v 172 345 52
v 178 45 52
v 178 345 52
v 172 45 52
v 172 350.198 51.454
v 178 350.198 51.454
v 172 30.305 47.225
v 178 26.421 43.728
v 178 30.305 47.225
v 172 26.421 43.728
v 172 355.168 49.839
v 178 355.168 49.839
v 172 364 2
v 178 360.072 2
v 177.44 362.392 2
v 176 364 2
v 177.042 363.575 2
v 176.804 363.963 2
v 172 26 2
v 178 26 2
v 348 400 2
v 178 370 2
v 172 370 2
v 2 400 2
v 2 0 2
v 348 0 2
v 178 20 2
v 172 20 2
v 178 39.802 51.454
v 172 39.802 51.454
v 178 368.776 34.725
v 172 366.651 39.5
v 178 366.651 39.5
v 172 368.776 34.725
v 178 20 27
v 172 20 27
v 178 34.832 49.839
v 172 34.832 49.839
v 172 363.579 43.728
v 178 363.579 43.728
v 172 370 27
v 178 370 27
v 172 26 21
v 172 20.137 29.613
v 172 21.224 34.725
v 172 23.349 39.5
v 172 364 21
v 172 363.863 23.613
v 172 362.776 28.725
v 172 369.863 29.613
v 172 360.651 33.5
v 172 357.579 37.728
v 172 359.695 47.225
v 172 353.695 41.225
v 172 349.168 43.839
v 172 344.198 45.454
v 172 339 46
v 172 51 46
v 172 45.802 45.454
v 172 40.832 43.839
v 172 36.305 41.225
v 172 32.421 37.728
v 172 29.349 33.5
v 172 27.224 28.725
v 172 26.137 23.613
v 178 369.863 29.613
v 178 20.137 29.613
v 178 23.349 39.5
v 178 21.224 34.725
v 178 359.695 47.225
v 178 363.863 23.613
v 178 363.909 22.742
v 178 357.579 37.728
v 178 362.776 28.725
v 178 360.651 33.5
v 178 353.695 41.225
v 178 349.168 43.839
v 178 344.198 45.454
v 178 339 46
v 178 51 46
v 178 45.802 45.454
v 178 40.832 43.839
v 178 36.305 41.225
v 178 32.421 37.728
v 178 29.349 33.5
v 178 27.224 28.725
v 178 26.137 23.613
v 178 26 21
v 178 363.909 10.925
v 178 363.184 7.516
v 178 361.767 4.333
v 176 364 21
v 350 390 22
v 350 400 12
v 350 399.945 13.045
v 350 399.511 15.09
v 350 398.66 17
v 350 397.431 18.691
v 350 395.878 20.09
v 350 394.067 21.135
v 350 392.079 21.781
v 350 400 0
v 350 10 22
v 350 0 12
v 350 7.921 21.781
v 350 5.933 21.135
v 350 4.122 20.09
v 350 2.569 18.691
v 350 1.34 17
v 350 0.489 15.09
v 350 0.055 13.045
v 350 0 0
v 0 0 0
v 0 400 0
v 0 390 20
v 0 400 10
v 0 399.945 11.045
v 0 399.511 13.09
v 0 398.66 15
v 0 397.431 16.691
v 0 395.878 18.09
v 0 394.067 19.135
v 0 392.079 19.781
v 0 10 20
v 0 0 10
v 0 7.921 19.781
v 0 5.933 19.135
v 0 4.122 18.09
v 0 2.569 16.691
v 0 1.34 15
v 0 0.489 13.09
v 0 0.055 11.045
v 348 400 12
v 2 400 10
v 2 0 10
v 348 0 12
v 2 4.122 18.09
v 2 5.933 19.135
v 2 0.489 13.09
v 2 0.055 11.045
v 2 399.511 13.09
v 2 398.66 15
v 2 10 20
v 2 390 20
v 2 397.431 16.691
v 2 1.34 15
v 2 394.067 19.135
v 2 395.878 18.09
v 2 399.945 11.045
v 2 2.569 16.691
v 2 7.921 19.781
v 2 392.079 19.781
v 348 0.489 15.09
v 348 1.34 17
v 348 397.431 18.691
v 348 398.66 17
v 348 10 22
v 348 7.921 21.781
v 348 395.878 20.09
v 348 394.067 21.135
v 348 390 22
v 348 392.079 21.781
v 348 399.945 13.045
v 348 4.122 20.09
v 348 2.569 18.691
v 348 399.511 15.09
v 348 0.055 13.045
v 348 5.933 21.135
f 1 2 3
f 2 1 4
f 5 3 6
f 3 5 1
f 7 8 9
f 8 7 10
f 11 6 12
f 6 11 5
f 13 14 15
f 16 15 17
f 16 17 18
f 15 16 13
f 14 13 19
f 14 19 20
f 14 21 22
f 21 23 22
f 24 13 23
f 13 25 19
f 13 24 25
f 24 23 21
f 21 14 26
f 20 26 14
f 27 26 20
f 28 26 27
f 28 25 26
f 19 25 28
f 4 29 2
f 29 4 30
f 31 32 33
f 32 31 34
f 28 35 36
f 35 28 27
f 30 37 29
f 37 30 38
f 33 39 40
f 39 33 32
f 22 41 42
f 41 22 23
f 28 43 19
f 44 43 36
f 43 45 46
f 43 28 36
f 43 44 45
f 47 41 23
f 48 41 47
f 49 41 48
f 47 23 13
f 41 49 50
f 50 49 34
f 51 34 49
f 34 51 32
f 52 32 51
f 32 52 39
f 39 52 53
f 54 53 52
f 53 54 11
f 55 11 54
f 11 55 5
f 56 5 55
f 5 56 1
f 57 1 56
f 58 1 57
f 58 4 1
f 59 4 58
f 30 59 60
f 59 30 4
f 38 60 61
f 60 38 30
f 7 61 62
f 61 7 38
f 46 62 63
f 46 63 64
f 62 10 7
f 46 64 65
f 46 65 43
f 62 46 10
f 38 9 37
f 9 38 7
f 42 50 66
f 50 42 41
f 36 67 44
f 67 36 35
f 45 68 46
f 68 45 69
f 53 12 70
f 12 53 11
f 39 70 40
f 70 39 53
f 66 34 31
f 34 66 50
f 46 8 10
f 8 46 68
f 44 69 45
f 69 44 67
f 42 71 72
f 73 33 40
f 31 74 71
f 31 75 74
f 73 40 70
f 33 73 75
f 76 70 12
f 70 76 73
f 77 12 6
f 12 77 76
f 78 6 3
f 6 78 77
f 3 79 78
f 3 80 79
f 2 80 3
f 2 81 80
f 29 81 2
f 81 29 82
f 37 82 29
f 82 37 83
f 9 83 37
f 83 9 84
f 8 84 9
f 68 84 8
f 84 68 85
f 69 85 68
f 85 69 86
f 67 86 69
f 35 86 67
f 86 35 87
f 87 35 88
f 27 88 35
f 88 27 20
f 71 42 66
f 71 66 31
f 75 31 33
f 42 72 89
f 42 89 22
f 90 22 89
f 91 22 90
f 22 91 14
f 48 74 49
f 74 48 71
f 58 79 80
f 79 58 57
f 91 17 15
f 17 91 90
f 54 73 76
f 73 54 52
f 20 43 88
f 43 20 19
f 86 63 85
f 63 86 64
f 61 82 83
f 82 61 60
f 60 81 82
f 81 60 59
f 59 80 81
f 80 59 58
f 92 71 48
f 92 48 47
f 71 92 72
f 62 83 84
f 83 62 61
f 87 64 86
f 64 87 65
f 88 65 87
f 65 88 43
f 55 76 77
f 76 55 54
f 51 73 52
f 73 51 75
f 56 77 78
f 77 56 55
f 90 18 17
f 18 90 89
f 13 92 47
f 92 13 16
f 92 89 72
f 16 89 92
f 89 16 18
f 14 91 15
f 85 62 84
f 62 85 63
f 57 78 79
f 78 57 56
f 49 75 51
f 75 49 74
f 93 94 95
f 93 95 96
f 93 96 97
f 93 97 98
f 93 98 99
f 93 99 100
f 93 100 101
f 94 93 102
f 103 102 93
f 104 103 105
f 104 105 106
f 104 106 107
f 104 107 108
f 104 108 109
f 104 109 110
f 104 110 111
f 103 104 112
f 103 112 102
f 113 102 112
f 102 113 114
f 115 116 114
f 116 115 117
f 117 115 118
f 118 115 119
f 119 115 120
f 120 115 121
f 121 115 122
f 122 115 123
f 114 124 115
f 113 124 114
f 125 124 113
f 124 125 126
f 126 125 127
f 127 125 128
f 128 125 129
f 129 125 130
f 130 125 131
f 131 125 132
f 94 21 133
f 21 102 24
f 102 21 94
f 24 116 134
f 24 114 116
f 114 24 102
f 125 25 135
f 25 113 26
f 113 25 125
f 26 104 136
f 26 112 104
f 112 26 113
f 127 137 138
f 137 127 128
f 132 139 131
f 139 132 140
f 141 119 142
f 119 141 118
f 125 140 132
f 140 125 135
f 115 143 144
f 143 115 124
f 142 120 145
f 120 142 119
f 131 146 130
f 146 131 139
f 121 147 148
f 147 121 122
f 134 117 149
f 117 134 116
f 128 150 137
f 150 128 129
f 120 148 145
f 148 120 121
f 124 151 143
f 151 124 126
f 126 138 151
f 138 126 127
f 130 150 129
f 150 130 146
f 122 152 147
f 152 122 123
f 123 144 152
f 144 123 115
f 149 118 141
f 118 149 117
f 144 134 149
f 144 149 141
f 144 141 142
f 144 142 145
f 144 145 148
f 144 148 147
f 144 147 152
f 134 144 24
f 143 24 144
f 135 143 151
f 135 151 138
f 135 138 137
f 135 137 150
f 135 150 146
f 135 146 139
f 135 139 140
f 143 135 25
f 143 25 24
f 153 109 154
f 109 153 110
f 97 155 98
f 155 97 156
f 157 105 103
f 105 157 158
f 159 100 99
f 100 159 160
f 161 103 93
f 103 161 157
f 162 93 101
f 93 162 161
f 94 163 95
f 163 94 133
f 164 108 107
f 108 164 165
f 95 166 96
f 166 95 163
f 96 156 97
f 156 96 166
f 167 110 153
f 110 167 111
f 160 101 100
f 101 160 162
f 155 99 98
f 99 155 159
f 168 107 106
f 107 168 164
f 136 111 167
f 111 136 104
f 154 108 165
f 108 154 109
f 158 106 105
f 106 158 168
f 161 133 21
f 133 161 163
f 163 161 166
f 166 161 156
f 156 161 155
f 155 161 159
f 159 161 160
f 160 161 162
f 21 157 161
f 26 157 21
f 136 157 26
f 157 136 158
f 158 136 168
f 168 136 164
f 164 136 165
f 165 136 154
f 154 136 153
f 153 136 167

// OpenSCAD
//Drip tray A
R280_driptrayB();

module R280_driptrayA(x){
    w=5;
    d=400;
    h=20;

  color("silver"){
    difference(){
        cube([x, d, h]);
        translate([5,5,2])cube([x-10, d-10, h]);
        translate([x-5,100,5])cube([10, 100, 50]);
        translate([-2,100,5])cube([10, 100, 50]);     
    }

    for(i=[10:20:x-20]){
        translate([i, 0, 0])cube([w,d,h]);
    }
  }
}

module R280_driptrayB(){
    w = 350;
    x=5;
    d=400;
    h=20;
    hh=50;
    ht=6;
    t=2; //厚み

  color("silver"){
    cube([w, d, t]);
    hull(){
      translate([0,0,0]) cube([t, d, h/2]);
      translate([0,h/2,h-h/2]) rotate([0,90,0])cylinder(h=t, r=h/2);
      translate([0,d-h/2,h-h/2]) rotate([0,90,0])cylinder(h=t, r=h/2);
    }
    translate([w-t, 0, t])
    hull(){
      translate([0,0,0]) cube([t, d, h/2]);
      translate([0,h/2,h-h/2]) rotate([0,90,0])cylinder(h=t, r=h/2);
      translate([0,d-h/2,h-h/2]) rotate([0,90,0])cylinder(h=t, r=h/2);
    }
    
    translate([w/2-3, 20, t])handle();

    for(i=[10:20:x-20]){
        translate([i, 0, 0])cube([w,d,h]);
    }
  }
}

//handle();
module handle(){
  difference(){
  hull(){
    hull(){
      cube([6, 50, 25]);
      translate([0, 25, 25]) rotate([0,90,0]) cylinder(h=6, r=25);
    }
    translate([0, 350-50, 0])
    hull(){
      cube([6, 50, 25]);
      translate([0, 25, 25]) rotate([0,90,0]) cylinder(h=6, r=25);
    }
  }
  color("pink")
  translate([0,6,-6])
  hull(){
    hull(){
      translate([-3,0,0]) cube([10, 50, 25]);
      translate([0, 25, 25]) rotate([0,90,0]) cylinder(h=10, r=25);
    }
    translate([-3, 350-50-6*2, 0])
    hull(){
      translate([-3,0,0]) cube([10, 50, 25]);
      translate([0, 25, 25]) rotate([0,90,0]) cylinder(h=10, r=25);
    }
  }
  }
}
